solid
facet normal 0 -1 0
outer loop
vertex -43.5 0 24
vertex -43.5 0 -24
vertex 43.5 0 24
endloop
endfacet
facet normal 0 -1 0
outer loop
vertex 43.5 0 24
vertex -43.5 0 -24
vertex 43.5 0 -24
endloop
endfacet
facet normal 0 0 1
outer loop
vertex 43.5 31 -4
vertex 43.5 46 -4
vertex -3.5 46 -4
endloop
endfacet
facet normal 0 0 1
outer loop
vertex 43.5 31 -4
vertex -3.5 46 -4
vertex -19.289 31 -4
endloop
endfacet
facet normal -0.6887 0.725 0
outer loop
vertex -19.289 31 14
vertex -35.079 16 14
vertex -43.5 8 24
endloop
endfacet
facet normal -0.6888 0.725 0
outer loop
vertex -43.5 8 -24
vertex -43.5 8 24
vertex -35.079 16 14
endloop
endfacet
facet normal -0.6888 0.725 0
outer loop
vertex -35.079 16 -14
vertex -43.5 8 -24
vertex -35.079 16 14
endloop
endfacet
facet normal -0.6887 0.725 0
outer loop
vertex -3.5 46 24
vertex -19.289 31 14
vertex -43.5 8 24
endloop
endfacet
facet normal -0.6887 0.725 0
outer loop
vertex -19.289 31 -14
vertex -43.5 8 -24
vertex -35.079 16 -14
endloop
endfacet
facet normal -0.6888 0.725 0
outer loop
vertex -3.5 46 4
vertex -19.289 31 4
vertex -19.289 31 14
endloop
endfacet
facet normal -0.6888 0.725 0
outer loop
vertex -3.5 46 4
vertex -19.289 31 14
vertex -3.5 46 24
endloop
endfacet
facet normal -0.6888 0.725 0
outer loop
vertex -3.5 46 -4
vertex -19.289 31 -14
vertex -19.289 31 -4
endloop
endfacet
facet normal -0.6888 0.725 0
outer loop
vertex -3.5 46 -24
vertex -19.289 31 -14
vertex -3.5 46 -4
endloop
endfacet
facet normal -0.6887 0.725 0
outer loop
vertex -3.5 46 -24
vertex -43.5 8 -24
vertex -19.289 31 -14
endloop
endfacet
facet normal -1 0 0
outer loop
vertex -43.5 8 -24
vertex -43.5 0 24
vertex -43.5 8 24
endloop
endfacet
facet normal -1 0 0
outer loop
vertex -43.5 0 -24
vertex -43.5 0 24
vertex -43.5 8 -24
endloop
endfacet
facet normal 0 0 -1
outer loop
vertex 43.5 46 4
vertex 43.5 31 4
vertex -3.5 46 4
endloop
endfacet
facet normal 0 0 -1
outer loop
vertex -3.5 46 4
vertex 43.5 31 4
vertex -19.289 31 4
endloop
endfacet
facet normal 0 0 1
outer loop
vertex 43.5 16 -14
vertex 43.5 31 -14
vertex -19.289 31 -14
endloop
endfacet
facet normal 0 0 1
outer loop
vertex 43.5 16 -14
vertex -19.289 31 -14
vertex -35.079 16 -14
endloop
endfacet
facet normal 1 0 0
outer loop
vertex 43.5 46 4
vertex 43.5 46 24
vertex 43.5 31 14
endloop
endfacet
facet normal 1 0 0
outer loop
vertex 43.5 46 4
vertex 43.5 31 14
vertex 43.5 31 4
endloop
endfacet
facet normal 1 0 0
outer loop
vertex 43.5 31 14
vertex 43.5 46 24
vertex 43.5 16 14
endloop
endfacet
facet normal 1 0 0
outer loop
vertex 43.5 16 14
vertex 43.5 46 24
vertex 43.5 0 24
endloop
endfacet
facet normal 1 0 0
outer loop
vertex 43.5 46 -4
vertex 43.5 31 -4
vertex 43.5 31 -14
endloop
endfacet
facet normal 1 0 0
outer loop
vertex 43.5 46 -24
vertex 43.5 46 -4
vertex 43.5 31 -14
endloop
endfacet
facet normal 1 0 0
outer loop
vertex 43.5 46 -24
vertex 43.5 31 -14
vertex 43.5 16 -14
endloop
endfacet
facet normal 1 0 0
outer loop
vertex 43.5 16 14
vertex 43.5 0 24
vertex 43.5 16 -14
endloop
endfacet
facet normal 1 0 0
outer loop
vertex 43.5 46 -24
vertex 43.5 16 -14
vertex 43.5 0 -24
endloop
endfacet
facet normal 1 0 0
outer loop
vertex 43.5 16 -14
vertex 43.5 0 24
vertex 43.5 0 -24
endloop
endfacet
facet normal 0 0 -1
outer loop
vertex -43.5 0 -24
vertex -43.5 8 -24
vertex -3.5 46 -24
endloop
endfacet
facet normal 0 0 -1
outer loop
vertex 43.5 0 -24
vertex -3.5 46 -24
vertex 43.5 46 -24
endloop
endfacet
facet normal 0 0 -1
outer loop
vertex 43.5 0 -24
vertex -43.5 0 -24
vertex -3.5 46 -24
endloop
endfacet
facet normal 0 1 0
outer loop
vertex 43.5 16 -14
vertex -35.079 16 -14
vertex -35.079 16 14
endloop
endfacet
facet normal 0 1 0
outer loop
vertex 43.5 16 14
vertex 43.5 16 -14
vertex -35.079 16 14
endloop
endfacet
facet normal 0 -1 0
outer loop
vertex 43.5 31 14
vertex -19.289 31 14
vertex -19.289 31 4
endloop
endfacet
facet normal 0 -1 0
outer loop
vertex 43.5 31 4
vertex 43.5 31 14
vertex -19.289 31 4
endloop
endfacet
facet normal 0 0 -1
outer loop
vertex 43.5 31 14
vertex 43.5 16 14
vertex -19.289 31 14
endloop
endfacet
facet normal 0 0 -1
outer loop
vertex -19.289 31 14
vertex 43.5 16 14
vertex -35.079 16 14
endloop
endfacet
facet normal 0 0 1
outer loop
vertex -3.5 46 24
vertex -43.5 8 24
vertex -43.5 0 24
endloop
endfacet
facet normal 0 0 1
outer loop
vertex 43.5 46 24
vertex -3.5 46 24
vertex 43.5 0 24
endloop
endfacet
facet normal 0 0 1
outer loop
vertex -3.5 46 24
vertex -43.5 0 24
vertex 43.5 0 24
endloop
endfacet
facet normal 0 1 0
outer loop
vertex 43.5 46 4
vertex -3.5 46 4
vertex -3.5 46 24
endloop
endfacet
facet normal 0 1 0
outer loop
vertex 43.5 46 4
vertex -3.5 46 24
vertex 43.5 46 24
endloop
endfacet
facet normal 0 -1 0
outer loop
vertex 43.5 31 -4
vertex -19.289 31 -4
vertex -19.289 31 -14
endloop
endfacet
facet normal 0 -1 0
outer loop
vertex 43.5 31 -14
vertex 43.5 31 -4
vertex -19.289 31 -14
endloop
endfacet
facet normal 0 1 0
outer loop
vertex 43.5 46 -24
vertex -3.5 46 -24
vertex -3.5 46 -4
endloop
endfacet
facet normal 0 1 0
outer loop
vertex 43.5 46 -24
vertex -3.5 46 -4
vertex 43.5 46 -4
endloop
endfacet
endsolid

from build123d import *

# Parameters (mm, degrees)
SKETCH1_W               = 87
SKETCH1_H               = 48
BOSS_EXTRUDE1_DEPTH     = 46
CUT_EXTRUDE1_DEPTH      = 68.707089732
CUT_EXTRUDE1_DEPTH_BACK = 68.707089732
CUT_EXTRUDE2_DEPTH      = 68.707089732
CUT_EXTRUDE2_DEPTH_BACK = 68.707089732


with BuildPart() as part:
    # Sketch1 → Boss-Extrude1 (new body)
    with BuildSketch(Plane(origin=(0, 0, 0), x_dir=(1, 0, 0), z_dir=(0, 1, 0))):
        Rectangle(SKETCH1_W, SKETCH1_H)
    extrude(amount=BOSS_EXTRUDE1_DEPTH)

    # Sketch2 → Cut-Extrude1 (cut, two sides: drawn at the far end of the back side and taken through both)
    with BuildSketch(Plane(origin=(0, 0, 0), x_dir=(0, 0, -1), z_dir=(1, 0, 0)).offset(-CUT_EXTRUDE1_DEPTH_BACK)):
        Polygon((4, 31), (14, 31), (14, 16), (-14, 16), (-14, 31), (-4, 31), (-4, 46), (4, 46), align=None)
    extrude(amount=CUT_EXTRUDE1_DEPTH + CUT_EXTRUDE1_DEPTH_BACK, mode=Mode.SUBTRACT)

    # Sketch3 → Cut-Extrude2 (cut, two sides: drawn at the far end of the back side and taken through both)
    with BuildSketch(Plane.XY.offset(-CUT_EXTRUDE2_DEPTH_BACK)):
        Polygon((-43.5, 46), (-43.5, 8), (-3.5, 46), align=None)
    extrude(amount=CUT_EXTRUDE2_DEPTH + CUT_EXTRUDE2_DEPTH_BACK, mode=Mode.SUBTRACT)


solid = part.part
